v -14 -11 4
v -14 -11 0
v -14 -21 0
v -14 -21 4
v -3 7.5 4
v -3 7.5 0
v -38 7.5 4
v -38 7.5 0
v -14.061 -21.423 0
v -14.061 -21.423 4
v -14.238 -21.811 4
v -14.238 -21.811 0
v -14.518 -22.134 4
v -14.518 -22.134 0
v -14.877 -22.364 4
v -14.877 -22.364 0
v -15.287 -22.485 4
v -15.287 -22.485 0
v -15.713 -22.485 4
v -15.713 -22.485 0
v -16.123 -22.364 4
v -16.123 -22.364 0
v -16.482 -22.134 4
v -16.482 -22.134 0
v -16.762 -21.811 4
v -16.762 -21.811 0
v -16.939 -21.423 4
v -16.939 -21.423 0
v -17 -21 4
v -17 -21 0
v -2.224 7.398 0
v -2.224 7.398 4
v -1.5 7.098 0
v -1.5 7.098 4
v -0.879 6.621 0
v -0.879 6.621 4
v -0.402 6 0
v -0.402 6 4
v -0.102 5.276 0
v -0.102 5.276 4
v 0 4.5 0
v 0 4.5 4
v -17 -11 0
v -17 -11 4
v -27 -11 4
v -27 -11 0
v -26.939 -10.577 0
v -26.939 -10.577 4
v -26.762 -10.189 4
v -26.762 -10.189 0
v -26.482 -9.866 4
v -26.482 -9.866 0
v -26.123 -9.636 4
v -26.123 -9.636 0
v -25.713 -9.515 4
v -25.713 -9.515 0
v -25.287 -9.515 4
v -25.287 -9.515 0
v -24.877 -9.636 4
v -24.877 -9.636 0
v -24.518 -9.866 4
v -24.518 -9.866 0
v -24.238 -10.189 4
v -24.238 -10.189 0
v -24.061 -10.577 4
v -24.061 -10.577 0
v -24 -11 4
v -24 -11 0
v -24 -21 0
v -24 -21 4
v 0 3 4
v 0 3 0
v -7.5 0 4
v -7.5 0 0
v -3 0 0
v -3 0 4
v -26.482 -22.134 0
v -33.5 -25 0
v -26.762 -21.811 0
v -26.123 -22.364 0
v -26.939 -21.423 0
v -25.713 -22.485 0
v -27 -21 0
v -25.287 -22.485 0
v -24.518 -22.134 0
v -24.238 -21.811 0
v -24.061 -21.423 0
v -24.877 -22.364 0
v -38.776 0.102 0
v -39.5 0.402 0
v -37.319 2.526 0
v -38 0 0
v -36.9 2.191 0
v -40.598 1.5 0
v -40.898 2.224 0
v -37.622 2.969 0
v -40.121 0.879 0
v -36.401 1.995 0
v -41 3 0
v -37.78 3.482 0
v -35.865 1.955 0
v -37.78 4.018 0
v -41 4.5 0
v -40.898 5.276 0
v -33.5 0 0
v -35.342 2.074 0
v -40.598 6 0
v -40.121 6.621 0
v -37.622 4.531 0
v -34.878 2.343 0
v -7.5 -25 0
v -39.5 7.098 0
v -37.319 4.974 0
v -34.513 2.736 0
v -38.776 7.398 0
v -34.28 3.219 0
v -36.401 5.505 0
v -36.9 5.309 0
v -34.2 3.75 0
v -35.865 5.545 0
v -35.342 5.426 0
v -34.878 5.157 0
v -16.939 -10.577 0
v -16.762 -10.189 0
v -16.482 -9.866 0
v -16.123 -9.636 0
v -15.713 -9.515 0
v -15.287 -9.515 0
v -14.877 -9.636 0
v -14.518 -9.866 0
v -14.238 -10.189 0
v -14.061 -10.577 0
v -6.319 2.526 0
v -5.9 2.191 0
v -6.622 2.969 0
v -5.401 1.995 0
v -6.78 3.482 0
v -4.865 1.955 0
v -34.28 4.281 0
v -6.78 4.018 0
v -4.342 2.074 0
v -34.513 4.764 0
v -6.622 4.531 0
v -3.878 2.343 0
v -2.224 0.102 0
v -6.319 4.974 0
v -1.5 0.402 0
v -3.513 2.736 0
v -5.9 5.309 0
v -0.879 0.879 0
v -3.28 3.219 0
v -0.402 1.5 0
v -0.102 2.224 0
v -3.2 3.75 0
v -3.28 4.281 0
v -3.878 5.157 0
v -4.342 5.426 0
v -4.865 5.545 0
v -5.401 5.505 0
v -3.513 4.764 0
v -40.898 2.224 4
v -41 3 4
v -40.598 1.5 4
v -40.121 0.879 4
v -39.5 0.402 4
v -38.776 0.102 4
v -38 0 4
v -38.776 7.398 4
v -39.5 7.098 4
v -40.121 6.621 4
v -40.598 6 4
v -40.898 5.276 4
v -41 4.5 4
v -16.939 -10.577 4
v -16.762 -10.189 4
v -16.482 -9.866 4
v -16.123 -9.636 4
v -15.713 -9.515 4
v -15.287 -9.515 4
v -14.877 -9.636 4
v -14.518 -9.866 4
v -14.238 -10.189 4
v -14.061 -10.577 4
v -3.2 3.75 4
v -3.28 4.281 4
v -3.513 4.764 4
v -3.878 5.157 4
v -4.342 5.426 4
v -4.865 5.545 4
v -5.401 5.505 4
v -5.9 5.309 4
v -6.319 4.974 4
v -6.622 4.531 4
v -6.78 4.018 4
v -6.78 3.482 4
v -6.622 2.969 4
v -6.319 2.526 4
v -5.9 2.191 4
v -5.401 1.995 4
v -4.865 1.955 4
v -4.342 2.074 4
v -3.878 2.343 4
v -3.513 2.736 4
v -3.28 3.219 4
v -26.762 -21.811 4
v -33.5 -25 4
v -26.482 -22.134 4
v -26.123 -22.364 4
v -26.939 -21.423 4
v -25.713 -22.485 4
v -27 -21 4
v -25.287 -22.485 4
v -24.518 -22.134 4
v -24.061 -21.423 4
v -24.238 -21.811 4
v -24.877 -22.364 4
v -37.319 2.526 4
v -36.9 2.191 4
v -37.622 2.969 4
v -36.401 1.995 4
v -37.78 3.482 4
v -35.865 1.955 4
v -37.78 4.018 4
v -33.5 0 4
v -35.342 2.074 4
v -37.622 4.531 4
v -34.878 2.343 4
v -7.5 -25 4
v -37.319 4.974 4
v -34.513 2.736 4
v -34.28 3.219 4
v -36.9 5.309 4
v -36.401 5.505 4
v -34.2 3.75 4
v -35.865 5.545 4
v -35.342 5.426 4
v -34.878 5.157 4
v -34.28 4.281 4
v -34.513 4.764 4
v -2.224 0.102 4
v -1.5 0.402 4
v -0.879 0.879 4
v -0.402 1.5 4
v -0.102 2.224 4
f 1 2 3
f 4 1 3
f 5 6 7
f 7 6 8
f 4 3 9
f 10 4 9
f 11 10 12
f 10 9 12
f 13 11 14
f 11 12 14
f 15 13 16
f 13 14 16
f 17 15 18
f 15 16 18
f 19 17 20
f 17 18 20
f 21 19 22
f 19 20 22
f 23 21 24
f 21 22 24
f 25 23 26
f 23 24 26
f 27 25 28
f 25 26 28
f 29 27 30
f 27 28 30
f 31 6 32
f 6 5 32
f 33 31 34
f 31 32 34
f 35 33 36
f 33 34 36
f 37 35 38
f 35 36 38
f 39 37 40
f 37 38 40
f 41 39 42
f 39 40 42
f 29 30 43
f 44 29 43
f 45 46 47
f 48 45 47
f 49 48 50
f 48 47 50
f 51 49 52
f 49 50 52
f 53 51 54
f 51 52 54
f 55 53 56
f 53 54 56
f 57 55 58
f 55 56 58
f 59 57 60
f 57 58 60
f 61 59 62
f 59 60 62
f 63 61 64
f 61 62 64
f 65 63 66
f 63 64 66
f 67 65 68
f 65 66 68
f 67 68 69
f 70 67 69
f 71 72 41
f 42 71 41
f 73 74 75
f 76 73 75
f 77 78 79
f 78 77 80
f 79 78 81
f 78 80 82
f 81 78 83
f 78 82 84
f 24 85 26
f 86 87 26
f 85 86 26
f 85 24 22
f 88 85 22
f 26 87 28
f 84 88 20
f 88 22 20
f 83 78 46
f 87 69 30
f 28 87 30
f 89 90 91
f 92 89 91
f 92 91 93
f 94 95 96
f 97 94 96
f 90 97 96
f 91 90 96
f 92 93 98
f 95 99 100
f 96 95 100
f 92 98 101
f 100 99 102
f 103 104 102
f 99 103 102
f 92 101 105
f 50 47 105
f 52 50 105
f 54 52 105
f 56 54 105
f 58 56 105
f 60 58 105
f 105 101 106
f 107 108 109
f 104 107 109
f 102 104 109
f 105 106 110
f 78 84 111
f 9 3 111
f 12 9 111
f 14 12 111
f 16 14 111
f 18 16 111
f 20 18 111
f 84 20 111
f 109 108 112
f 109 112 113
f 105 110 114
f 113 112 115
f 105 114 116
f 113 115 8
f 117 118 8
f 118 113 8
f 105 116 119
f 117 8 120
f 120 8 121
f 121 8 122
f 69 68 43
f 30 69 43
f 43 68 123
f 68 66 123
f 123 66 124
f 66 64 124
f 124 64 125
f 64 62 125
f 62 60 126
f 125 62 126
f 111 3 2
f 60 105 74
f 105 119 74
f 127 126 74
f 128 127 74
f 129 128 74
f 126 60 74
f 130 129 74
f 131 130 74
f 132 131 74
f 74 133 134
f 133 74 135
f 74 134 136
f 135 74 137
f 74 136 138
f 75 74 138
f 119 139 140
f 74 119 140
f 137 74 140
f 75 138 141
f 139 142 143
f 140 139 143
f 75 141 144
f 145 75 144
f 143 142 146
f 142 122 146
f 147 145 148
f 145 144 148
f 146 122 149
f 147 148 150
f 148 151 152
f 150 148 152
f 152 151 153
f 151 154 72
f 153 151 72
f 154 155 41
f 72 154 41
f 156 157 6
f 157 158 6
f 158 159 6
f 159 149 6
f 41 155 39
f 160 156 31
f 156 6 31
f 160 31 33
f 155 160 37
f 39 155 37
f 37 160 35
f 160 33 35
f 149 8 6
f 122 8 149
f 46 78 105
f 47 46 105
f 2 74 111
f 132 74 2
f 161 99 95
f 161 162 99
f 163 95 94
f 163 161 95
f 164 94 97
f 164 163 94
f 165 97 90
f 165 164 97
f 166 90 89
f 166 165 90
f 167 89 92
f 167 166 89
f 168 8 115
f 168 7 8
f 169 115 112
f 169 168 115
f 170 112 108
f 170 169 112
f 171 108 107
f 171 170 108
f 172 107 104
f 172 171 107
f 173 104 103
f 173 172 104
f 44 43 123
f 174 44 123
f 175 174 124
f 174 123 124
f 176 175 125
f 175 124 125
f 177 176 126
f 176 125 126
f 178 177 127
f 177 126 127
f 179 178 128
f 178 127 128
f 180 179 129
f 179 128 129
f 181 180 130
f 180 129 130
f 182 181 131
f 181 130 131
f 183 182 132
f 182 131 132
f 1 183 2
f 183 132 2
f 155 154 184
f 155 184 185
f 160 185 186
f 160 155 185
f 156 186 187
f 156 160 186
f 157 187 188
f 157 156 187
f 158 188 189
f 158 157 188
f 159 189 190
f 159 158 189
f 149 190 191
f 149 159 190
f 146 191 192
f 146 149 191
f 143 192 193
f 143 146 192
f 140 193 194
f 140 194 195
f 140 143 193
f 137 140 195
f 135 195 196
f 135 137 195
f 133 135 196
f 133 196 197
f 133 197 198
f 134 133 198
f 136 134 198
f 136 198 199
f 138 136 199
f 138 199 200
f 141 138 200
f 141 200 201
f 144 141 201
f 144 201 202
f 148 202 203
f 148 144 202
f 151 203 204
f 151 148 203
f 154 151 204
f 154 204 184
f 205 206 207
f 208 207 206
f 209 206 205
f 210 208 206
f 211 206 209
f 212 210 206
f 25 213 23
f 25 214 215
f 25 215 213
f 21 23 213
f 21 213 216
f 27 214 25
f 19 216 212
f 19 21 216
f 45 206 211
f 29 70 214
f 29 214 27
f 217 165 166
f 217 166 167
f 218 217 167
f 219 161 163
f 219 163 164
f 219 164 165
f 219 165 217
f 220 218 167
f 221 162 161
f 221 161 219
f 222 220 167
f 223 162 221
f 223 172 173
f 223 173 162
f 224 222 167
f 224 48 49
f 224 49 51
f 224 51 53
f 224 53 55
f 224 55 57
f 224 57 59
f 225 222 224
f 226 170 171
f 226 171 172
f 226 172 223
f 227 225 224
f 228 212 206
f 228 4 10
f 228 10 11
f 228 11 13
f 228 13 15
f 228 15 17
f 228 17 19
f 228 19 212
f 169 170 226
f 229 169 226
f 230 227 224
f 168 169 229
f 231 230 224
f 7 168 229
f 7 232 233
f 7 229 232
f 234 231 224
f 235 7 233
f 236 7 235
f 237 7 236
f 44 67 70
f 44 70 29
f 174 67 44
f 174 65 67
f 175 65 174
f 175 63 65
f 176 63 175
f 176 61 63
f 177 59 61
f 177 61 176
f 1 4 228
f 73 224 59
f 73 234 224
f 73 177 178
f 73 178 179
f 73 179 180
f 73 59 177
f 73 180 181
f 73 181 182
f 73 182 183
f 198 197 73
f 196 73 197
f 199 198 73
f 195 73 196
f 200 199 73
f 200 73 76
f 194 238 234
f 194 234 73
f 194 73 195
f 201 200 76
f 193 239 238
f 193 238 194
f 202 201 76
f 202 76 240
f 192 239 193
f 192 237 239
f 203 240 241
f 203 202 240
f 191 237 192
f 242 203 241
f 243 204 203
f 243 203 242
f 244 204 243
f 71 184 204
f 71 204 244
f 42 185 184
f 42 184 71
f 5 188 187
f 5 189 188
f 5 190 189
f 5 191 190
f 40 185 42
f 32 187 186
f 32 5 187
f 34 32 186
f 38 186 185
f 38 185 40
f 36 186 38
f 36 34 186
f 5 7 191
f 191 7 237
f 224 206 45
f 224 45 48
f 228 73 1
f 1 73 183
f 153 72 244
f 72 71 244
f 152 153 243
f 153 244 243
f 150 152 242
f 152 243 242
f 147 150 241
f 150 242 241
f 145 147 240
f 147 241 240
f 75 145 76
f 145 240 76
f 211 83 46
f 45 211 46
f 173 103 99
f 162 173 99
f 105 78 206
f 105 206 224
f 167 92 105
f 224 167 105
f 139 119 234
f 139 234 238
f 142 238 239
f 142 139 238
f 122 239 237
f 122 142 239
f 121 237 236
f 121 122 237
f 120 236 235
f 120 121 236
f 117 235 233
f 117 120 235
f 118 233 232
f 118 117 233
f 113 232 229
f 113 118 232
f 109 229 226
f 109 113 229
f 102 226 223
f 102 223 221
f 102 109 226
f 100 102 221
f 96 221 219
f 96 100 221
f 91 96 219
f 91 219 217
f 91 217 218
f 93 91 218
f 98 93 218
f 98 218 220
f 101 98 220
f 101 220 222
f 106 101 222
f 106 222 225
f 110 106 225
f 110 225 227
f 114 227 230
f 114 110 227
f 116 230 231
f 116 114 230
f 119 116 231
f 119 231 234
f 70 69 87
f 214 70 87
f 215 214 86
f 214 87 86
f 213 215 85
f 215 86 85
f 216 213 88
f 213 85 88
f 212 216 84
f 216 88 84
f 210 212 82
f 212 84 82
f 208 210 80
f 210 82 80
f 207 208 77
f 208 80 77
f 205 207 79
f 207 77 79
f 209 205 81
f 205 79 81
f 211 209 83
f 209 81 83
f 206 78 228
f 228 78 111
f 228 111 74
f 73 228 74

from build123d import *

# Parameters (mm, degrees)
F0_R     = 1.8
F0_W     = 26
F0_H     = 25
F1_DEPTH = 4
F2_R     = 3


# Not quite as in the source:
# - a feature names something its author has since deleted; it is built from what else it names


with BuildPart() as f1:
    # F0 (on Top) → F1 (new body)
    with BuildSketch(Plane.XY):
        Polygon((0, 7.5), (-41, 7.5), (-41, 0), (-33.5, 0), (-7.5, 0), (0, 0), align=None)
        with Locations((-36, 3.75)):
            Circle(F0_R, mode=Mode.SUBTRACT)
        with Locations((-5, 3.75)):
            Circle(F0_R, mode=Mode.SUBTRACT)
        with Locations((-20.5, -12.5)):
            Rectangle(F0_W, F0_H)
        with BuildLine():
            Line((-27, -21), (-27, -11))
            ThreePointArc((-27, -11), (-25.5, -9.5), (-24, -11))
            Line((-24, -11), (-24, -21))
            ThreePointArc((-24, -21), (-25.5, -22.5), (-27, -21))
        make_face(mode=Mode.SUBTRACT)
        with BuildLine():
            Line((-17, -21), (-17, -11))
            ThreePointArc((-17, -11), (-15.5, -9.5), (-14, -11))
            Line((-14, -11), (-14, -21))
            ThreePointArc((-14, -21), (-15.5, -22.5), (-17, -21))
        make_face(mode=Mode.SUBTRACT)
    extrude(amount=F1_DEPTH)

    # F2
    f2_edges = [f1.edges().sort_by_distance(p)[0] for p in [
        (0, 0, 2),
        (0, 7.5, 2),
        (-41, 0, 2),
        (-41, 7.5, 2),
    ]]
    fillet(f2_edges, radius=F2_R)


solid = f1.part
